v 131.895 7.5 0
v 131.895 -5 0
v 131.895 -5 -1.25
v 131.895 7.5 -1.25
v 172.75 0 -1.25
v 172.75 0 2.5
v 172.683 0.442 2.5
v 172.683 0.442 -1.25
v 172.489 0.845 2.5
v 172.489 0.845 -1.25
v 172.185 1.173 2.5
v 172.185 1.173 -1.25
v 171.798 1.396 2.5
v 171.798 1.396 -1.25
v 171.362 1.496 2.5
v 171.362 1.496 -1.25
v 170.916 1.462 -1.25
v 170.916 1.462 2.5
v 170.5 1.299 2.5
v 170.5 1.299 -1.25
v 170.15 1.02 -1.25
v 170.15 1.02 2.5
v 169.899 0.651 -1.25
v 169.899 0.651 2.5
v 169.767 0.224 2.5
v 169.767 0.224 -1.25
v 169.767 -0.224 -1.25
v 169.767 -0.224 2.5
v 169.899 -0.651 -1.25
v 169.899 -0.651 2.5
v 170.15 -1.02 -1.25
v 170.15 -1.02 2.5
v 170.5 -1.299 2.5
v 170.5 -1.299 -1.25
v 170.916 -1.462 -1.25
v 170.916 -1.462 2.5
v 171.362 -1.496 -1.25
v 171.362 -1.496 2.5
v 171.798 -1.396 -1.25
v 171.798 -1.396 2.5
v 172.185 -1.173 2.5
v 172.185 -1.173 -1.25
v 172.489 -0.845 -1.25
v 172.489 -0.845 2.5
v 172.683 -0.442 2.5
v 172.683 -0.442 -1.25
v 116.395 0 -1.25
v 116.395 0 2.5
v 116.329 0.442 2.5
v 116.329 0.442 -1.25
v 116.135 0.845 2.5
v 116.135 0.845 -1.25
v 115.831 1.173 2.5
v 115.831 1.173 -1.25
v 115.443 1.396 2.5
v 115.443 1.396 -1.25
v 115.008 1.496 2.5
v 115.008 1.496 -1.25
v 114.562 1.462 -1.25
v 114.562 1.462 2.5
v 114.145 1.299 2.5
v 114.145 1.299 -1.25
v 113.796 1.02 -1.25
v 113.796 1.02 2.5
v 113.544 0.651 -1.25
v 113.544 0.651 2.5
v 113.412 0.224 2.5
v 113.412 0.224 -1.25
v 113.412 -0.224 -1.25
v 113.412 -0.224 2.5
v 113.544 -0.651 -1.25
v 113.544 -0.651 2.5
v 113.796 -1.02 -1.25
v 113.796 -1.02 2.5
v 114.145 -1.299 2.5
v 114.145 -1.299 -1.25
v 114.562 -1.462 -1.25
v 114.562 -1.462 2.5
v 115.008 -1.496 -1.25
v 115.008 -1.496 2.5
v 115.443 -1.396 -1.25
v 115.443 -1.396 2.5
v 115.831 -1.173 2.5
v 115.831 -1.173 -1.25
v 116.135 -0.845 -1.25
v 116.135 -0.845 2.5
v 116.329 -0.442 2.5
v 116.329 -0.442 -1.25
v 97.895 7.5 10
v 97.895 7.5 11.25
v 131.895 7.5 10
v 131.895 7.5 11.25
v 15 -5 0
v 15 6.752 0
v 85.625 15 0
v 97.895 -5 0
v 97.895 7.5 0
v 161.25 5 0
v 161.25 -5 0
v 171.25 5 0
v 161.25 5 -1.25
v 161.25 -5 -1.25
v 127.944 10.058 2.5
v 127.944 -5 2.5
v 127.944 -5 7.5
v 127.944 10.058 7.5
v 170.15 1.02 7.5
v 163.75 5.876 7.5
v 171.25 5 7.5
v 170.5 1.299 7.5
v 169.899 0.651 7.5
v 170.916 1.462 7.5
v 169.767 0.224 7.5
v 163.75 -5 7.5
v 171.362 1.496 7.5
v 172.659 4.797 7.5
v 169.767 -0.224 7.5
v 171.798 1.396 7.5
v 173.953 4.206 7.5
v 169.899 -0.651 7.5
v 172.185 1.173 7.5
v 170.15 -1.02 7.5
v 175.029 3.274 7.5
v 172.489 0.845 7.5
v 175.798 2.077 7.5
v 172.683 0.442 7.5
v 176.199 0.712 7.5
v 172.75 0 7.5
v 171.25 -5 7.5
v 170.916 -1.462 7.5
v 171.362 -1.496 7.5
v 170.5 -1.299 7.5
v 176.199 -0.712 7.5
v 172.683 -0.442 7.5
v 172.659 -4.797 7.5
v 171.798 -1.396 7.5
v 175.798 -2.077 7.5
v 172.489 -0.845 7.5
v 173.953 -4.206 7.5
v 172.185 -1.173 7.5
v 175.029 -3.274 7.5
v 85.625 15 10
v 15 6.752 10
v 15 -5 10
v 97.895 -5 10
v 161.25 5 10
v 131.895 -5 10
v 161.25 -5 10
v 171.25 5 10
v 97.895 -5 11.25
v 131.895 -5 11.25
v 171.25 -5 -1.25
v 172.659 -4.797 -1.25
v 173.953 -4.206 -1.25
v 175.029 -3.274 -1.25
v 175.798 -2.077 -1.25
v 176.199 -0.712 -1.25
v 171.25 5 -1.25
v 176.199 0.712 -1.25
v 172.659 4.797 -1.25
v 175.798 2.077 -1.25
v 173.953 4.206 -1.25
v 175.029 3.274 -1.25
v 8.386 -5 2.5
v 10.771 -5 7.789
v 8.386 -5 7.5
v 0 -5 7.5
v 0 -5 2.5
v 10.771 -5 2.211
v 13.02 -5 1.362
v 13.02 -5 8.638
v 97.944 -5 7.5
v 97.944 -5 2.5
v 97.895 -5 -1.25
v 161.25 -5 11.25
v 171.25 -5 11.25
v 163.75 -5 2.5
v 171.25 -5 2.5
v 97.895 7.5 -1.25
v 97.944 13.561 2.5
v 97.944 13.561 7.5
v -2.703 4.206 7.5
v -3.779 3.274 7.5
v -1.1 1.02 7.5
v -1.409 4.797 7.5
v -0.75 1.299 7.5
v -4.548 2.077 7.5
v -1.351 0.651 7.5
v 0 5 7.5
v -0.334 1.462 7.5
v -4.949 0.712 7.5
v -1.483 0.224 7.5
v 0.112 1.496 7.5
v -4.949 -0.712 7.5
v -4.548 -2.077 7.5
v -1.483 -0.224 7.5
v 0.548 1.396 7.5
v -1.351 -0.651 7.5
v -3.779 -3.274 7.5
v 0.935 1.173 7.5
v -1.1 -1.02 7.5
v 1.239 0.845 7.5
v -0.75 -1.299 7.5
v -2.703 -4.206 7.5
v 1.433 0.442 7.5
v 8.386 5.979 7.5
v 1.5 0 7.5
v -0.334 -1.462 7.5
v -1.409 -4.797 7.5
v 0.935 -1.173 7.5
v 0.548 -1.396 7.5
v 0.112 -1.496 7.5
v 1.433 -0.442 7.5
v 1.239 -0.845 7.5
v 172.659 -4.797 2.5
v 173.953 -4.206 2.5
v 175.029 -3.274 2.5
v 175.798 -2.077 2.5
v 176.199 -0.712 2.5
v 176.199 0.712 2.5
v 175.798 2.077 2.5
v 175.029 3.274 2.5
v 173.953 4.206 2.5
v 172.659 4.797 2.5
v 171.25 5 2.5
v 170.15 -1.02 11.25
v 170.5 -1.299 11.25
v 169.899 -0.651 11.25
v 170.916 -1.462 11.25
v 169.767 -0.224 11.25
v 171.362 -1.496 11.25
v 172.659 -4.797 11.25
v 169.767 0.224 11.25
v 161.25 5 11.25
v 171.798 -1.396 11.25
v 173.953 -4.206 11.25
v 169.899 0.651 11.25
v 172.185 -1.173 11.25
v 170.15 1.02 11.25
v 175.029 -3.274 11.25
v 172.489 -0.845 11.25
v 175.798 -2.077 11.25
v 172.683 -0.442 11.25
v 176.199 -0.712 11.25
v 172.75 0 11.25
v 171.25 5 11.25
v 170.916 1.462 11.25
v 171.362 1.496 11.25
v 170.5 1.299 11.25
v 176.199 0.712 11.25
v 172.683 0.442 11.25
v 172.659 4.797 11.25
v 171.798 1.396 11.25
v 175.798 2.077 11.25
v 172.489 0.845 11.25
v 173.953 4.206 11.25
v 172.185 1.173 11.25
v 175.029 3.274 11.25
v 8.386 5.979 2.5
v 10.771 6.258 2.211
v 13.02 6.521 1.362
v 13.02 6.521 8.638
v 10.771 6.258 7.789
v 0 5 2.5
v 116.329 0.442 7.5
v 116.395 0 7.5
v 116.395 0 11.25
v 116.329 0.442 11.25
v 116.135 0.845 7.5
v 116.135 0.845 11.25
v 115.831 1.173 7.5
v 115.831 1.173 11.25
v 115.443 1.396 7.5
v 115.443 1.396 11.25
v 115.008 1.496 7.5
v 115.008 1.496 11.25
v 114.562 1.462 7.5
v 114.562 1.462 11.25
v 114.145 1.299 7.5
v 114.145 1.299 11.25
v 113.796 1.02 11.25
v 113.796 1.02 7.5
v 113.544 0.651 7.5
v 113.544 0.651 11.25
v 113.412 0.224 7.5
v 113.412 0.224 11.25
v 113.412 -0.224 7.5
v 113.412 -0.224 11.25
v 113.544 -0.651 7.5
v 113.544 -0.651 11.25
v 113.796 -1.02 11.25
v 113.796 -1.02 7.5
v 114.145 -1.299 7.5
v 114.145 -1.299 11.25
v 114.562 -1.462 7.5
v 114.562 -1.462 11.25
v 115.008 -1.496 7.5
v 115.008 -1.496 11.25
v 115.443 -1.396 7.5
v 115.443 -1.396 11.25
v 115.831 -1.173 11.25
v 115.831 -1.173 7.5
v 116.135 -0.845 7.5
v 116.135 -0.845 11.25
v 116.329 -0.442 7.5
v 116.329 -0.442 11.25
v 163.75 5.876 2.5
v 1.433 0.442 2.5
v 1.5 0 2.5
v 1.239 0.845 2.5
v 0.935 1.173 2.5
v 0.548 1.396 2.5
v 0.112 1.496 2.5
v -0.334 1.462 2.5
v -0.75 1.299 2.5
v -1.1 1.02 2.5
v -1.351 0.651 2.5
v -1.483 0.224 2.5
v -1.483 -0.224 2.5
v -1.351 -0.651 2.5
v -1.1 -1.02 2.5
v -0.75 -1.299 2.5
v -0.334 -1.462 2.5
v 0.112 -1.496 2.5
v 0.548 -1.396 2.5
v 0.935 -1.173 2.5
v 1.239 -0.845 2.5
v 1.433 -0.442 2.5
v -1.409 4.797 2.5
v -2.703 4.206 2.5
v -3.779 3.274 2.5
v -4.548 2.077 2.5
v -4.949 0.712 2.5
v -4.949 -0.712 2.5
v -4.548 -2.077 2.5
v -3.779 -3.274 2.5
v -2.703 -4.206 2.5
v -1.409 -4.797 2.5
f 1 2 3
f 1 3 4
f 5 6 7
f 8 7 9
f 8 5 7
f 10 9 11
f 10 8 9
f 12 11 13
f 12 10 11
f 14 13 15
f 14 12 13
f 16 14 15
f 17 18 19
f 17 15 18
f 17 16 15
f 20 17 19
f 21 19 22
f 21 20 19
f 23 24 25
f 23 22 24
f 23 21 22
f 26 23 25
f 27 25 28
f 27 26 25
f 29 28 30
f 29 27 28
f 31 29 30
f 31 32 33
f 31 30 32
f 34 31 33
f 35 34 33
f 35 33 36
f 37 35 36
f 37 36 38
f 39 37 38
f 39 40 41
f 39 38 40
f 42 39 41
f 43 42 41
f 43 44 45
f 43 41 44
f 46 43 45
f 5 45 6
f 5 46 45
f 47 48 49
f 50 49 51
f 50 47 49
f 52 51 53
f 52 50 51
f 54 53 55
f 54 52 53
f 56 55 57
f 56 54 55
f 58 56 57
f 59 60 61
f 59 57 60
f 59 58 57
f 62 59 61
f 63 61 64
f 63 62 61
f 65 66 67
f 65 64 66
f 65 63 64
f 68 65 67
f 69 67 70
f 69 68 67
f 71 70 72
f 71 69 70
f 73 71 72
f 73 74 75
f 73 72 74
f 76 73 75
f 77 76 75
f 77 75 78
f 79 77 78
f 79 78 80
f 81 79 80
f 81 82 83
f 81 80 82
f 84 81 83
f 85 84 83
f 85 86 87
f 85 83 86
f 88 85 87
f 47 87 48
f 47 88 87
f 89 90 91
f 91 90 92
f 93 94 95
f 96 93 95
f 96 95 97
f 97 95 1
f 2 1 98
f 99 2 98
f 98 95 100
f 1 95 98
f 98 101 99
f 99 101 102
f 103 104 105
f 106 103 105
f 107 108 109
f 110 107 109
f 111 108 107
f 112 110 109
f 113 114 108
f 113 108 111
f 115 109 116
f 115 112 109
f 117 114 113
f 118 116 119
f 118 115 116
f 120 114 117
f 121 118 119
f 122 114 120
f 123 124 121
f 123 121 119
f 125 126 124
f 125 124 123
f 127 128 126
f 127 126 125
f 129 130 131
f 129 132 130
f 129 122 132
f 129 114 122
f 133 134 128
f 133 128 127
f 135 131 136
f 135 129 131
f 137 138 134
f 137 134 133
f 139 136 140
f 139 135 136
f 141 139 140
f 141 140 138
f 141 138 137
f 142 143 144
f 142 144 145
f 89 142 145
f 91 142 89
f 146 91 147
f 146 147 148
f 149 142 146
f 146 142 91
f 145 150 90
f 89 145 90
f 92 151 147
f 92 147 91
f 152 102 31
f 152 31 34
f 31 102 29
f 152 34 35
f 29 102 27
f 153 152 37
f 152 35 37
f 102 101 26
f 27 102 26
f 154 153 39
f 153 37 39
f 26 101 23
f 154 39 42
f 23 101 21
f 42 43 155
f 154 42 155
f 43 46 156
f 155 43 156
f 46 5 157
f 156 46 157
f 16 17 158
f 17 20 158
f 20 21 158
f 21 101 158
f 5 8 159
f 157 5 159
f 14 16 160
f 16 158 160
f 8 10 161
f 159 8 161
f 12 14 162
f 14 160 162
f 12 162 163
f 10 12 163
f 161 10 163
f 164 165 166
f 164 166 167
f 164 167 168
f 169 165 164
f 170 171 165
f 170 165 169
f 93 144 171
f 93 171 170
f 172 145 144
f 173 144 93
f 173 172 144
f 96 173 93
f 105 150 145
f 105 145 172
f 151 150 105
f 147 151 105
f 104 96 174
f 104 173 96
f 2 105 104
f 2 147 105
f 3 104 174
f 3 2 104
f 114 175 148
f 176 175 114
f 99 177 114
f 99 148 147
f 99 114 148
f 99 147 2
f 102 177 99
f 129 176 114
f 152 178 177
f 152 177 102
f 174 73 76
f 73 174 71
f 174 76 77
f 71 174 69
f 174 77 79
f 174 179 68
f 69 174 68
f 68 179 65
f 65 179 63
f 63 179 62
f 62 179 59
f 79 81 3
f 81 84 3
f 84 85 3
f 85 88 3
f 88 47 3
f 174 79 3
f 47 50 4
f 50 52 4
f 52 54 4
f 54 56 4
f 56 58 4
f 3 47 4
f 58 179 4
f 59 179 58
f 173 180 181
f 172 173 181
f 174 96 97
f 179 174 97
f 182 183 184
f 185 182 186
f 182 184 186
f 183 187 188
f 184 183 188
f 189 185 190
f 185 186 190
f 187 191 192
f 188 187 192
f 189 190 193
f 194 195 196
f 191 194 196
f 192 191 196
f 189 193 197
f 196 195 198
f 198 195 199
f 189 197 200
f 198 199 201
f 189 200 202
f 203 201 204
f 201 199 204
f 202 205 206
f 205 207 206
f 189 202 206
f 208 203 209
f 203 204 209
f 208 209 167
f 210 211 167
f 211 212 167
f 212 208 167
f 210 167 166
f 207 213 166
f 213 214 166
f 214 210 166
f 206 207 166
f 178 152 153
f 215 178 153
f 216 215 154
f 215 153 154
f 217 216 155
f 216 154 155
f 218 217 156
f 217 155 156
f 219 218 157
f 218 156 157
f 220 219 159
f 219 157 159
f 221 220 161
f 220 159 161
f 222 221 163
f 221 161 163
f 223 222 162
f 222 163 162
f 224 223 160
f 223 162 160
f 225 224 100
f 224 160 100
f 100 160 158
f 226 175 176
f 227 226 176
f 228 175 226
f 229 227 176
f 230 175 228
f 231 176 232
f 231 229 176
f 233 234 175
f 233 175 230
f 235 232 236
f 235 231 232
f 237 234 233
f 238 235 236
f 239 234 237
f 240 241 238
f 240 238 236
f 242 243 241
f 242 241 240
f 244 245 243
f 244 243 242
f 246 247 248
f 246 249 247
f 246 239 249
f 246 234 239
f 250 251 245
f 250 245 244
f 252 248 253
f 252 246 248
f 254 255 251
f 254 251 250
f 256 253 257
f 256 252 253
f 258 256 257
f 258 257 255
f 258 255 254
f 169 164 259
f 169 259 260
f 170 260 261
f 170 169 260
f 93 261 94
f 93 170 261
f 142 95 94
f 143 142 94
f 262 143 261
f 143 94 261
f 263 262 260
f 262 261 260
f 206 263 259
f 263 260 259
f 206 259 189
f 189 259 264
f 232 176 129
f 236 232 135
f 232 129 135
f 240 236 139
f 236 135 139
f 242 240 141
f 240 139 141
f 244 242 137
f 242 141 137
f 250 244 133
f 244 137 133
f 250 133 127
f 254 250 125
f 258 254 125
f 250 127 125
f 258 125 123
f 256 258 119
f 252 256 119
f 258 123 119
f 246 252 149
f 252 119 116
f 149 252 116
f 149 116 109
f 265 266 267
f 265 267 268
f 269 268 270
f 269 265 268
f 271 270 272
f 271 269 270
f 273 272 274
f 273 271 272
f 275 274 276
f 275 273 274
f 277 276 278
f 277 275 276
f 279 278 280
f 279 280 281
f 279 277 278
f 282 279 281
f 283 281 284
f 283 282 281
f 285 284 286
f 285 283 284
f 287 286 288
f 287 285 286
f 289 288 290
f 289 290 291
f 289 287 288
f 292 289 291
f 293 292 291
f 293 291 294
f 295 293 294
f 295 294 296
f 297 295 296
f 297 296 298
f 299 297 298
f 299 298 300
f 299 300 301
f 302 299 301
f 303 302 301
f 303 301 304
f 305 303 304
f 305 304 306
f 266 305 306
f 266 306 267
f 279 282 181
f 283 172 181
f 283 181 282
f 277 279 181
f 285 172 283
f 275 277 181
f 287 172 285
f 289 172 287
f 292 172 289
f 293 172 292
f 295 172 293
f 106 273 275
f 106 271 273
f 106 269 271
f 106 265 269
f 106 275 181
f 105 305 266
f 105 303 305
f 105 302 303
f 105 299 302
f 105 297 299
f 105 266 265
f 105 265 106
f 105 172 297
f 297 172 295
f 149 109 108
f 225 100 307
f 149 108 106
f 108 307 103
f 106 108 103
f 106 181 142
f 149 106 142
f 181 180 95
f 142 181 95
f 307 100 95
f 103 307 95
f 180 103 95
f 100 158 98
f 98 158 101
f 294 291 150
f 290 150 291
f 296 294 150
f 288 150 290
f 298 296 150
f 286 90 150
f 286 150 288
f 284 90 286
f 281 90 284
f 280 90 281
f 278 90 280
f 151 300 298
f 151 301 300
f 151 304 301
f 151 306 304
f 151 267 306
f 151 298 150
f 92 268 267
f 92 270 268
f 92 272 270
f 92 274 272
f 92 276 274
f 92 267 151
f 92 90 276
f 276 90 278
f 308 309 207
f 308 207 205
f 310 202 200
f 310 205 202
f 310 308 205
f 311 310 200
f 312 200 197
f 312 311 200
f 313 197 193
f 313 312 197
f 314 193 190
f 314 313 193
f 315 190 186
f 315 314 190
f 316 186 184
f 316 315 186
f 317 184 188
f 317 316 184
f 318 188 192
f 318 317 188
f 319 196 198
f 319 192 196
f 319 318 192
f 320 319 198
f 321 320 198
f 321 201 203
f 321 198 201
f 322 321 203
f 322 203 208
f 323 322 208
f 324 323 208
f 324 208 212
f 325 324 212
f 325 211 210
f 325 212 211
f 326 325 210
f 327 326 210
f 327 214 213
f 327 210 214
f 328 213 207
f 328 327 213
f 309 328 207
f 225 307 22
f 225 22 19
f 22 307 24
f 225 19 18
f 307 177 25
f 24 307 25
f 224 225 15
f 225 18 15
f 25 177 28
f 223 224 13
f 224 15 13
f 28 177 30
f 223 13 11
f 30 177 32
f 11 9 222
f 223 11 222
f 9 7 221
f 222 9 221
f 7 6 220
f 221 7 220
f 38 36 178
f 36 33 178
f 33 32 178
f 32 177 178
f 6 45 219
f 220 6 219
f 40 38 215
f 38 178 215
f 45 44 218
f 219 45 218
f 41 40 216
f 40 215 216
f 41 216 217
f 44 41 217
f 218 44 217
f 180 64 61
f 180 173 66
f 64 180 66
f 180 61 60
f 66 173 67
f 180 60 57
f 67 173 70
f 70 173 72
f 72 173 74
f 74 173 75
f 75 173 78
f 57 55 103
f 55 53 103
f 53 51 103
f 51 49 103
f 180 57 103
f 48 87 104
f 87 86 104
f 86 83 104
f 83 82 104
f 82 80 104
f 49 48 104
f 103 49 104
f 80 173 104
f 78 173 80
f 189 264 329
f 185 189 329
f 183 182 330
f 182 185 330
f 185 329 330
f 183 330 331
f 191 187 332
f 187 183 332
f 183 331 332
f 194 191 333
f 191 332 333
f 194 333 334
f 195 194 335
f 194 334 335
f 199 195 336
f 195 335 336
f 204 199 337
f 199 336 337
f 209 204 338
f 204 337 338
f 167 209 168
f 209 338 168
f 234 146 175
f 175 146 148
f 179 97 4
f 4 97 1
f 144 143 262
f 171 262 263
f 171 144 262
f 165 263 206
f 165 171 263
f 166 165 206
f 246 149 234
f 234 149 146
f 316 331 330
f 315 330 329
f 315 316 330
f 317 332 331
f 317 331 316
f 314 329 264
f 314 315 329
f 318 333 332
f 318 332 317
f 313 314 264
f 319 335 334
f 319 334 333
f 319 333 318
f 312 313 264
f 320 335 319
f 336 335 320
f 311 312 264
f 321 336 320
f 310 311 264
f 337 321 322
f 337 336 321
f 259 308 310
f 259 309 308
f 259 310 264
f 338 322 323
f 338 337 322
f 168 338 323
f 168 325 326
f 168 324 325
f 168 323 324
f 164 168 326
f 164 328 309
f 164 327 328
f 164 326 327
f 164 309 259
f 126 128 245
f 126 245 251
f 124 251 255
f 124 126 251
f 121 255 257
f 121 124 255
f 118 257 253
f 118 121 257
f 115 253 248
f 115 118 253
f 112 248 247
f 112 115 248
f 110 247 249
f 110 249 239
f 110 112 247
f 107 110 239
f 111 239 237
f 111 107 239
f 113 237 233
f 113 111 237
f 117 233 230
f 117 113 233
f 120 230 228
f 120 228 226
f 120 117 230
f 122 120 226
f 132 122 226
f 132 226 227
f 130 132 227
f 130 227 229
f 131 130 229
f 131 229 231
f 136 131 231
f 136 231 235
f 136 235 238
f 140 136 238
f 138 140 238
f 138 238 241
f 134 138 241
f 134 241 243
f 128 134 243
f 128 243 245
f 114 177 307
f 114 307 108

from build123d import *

# Parameters (mm, degrees)
CROQUIS1_R              = 1.5
SALIENTE_EXTRUIR1_DEPTH = 10
CROQUIS2_R              = 1.5
CROQUIS2_W              = 34
CROQUIS2_H              = 12.5
SALIENTE_EXTRUIR2_DEPTH = 6.25
CROQUIS3_W              = 25
CROQUIS3_H              = 5
CORTAR_EXTRUIR1_DEPTH   = 15
CROQUIS4_W              = 30
CROQUIS4_H              = 5
CORTAR_EXTRUIR2_DEPTH   = 30
CROQUIS6_W              = 40
CROQUIS6_H              = 7.662708713
CORTAR_EXTRUIR3_DEPTH   = 60
REDONDEO1_R             = 10


with BuildPart() as part:
    # Croquis1 → Saliente-Extruir1 (new body)
    with BuildSketch(Plane.XY):
        with BuildLine():
            Line((0, -5), (171.25, -5))
            ThreePointArc((171.25, -5), (176.25, 0), (171.25, 5))
            Line((171.25, 5), (85.625, 15))
            Line((85.625, 15), (0, 5))
            ThreePointArc((0, 5), (-5, 0), (0, -5))
        make_face()
        with Locations((171.25, 0)):
            Circle(CROQUIS1_R, mode=Mode.SUBTRACT)
        Circle(CROQUIS1_R, mode=Mode.SUBTRACT)
        with Locations((114.8954508, 0)):
            Circle(CROQUIS1_R, mode=Mode.SUBTRACT)
    extrude(amount=SALIENTE_EXTRUIR1_DEPTH)

    # Croquis2 → Saliente-Extruir2 (add, symmetric)
    # profile 1 of 2: a face of its own
    with BuildSketch(Plane.XY.offset(5)):
        with BuildLine():
            Line((171.25, 5), (161.25, 5))
            Line((161.25, 5), (161.25, -5))
            Line((161.25, -5), (171.25, -5))
            ThreePointArc((171.25, -5), (176.25, 0), (171.25, 5))
        make_face()
        with Locations((171.25, 0)):
            Circle(CROQUIS2_R, mode=Mode.SUBTRACT)
    # profile 2 of 2: a face of its own
    with BuildSketch(Plane.XY.offset(5)):
        with Locations((114.8954508, 1.25)):
            Rectangle(CROQUIS2_W, CROQUIS2_H)
        with Locations((114.8954508, 0)):
            Circle(CROQUIS2_R, mode=Mode.SUBTRACT)
    extrude(amount=SALIENTE_EXTRUIR2_DEPTH, both=True)

    # Croquis3 → Cortar-Extruir1 (cut)
    with BuildSketch(Plane.XZ.offset(5)):
        with Locations((176.25, 5)):
            Rectangle(CROQUIS3_W, CROQUIS3_H)
    extrude(amount=-CORTAR_EXTRUIR1_DEPTH, mode=Mode.SUBTRACT)

    # Croquis4 → Cortar-Extruir2 (cut)
    with BuildSketch(Plane.XZ.offset(5)):
        with Locations((112.94374, 5)):
            Rectangle(CROQUIS4_W, CROQUIS4_H)
    extrude(amount=-CORTAR_EXTRUIR2_DEPTH, mode=Mode.SUBTRACT)

    # Croquis6 → Cortar-Extruir3 (cut)
    with BuildSketch(Plane.XZ.offset(5)):
        with Locations((-5, 11.331354357)):
            Rectangle(CROQUIS6_W, CROQUIS6_H)
        with Locations((-5, -1.331354357)):
            Rectangle(CROQUIS6_W, CROQUIS6_H)
    extrude(amount=-CORTAR_EXTRUIR3_DEPTH, mode=Mode.SUBTRACT)

    # Redondeo1
    # the kernel refuses this fillet: 10 mm, written as the material it adds along each edge
    with BuildSketch(Plane(origin=(15, -5, 2.5), x_dir=(-1, 0, 0), z_dir=(0, 1, 0))) as redondeo1_piece_1_section:
        with BuildLine():
            CenterArc((6.614378278, -10), REDONDEO1_R, 90, 41.409622109)
            Line((0, -2.5), (-0.132287566, -2.35))
            ThreePointArc((-0.132287566, -2.35), (-0.2, -1.25), (-0.2, 0))
            Line((-0.2, 0), (0, 0.2))
            Line((0, 0.2), (6.614378278, 0.2))
            Line((6.614378278, 0.2), (6.614378278, 0))
        make_face()
    redondeo1_piece_1 = extrude(amount=28.287770512, mode=Mode.PRIVATE)
    redondeo1_piece_1 = split(redondeo1_piece_1, bisect_by=Plane(origin=(12.547080383, 6.465352453, 1.89633879), z_dir=(0.11599990937510621, -0.9932492240243469, 0)), keep=Keep.TOP, mode=Mode.PRIVATE)
    add(redondeo1_piece_1)
    with BuildSketch(Plane(origin=(15, -5, 7.5), x_dir=(0, 0, 1), z_dir=(0, 1, 0))) as redondeo1_piece_2_section:
        with BuildLine():
            CenterArc((10, -6.614378278), REDONDEO1_R, 138.590377891, 41.409622109)
            Line((0, -6.614378278), (-0.2, -6.614378278))
            Line((-0.2, -6.614378278), (-0.2, 0))
            Line((-0.2, 0), (0, 0.2))
            ThreePointArc((0, 0.2), (1.25, 0.2), (2.35, 0.132287566))
            Line((2.35, 0.132287566), (2.5, 0))
        make_face()
    redondeo1_piece_2 = extrude(amount=28.287770512, mode=Mode.PRIVATE)
    redondeo1_piece_2 = split(redondeo1_piece_2, bisect_by=Plane(origin=(12.547080383, 6.465352453, 8.10366121), z_dir=(0.11599990937510621, -0.9932492240243469, 0)), keep=Keep.TOP, mode=Mode.PRIVATE)
    add(redondeo1_piece_2)


solid = part.part
